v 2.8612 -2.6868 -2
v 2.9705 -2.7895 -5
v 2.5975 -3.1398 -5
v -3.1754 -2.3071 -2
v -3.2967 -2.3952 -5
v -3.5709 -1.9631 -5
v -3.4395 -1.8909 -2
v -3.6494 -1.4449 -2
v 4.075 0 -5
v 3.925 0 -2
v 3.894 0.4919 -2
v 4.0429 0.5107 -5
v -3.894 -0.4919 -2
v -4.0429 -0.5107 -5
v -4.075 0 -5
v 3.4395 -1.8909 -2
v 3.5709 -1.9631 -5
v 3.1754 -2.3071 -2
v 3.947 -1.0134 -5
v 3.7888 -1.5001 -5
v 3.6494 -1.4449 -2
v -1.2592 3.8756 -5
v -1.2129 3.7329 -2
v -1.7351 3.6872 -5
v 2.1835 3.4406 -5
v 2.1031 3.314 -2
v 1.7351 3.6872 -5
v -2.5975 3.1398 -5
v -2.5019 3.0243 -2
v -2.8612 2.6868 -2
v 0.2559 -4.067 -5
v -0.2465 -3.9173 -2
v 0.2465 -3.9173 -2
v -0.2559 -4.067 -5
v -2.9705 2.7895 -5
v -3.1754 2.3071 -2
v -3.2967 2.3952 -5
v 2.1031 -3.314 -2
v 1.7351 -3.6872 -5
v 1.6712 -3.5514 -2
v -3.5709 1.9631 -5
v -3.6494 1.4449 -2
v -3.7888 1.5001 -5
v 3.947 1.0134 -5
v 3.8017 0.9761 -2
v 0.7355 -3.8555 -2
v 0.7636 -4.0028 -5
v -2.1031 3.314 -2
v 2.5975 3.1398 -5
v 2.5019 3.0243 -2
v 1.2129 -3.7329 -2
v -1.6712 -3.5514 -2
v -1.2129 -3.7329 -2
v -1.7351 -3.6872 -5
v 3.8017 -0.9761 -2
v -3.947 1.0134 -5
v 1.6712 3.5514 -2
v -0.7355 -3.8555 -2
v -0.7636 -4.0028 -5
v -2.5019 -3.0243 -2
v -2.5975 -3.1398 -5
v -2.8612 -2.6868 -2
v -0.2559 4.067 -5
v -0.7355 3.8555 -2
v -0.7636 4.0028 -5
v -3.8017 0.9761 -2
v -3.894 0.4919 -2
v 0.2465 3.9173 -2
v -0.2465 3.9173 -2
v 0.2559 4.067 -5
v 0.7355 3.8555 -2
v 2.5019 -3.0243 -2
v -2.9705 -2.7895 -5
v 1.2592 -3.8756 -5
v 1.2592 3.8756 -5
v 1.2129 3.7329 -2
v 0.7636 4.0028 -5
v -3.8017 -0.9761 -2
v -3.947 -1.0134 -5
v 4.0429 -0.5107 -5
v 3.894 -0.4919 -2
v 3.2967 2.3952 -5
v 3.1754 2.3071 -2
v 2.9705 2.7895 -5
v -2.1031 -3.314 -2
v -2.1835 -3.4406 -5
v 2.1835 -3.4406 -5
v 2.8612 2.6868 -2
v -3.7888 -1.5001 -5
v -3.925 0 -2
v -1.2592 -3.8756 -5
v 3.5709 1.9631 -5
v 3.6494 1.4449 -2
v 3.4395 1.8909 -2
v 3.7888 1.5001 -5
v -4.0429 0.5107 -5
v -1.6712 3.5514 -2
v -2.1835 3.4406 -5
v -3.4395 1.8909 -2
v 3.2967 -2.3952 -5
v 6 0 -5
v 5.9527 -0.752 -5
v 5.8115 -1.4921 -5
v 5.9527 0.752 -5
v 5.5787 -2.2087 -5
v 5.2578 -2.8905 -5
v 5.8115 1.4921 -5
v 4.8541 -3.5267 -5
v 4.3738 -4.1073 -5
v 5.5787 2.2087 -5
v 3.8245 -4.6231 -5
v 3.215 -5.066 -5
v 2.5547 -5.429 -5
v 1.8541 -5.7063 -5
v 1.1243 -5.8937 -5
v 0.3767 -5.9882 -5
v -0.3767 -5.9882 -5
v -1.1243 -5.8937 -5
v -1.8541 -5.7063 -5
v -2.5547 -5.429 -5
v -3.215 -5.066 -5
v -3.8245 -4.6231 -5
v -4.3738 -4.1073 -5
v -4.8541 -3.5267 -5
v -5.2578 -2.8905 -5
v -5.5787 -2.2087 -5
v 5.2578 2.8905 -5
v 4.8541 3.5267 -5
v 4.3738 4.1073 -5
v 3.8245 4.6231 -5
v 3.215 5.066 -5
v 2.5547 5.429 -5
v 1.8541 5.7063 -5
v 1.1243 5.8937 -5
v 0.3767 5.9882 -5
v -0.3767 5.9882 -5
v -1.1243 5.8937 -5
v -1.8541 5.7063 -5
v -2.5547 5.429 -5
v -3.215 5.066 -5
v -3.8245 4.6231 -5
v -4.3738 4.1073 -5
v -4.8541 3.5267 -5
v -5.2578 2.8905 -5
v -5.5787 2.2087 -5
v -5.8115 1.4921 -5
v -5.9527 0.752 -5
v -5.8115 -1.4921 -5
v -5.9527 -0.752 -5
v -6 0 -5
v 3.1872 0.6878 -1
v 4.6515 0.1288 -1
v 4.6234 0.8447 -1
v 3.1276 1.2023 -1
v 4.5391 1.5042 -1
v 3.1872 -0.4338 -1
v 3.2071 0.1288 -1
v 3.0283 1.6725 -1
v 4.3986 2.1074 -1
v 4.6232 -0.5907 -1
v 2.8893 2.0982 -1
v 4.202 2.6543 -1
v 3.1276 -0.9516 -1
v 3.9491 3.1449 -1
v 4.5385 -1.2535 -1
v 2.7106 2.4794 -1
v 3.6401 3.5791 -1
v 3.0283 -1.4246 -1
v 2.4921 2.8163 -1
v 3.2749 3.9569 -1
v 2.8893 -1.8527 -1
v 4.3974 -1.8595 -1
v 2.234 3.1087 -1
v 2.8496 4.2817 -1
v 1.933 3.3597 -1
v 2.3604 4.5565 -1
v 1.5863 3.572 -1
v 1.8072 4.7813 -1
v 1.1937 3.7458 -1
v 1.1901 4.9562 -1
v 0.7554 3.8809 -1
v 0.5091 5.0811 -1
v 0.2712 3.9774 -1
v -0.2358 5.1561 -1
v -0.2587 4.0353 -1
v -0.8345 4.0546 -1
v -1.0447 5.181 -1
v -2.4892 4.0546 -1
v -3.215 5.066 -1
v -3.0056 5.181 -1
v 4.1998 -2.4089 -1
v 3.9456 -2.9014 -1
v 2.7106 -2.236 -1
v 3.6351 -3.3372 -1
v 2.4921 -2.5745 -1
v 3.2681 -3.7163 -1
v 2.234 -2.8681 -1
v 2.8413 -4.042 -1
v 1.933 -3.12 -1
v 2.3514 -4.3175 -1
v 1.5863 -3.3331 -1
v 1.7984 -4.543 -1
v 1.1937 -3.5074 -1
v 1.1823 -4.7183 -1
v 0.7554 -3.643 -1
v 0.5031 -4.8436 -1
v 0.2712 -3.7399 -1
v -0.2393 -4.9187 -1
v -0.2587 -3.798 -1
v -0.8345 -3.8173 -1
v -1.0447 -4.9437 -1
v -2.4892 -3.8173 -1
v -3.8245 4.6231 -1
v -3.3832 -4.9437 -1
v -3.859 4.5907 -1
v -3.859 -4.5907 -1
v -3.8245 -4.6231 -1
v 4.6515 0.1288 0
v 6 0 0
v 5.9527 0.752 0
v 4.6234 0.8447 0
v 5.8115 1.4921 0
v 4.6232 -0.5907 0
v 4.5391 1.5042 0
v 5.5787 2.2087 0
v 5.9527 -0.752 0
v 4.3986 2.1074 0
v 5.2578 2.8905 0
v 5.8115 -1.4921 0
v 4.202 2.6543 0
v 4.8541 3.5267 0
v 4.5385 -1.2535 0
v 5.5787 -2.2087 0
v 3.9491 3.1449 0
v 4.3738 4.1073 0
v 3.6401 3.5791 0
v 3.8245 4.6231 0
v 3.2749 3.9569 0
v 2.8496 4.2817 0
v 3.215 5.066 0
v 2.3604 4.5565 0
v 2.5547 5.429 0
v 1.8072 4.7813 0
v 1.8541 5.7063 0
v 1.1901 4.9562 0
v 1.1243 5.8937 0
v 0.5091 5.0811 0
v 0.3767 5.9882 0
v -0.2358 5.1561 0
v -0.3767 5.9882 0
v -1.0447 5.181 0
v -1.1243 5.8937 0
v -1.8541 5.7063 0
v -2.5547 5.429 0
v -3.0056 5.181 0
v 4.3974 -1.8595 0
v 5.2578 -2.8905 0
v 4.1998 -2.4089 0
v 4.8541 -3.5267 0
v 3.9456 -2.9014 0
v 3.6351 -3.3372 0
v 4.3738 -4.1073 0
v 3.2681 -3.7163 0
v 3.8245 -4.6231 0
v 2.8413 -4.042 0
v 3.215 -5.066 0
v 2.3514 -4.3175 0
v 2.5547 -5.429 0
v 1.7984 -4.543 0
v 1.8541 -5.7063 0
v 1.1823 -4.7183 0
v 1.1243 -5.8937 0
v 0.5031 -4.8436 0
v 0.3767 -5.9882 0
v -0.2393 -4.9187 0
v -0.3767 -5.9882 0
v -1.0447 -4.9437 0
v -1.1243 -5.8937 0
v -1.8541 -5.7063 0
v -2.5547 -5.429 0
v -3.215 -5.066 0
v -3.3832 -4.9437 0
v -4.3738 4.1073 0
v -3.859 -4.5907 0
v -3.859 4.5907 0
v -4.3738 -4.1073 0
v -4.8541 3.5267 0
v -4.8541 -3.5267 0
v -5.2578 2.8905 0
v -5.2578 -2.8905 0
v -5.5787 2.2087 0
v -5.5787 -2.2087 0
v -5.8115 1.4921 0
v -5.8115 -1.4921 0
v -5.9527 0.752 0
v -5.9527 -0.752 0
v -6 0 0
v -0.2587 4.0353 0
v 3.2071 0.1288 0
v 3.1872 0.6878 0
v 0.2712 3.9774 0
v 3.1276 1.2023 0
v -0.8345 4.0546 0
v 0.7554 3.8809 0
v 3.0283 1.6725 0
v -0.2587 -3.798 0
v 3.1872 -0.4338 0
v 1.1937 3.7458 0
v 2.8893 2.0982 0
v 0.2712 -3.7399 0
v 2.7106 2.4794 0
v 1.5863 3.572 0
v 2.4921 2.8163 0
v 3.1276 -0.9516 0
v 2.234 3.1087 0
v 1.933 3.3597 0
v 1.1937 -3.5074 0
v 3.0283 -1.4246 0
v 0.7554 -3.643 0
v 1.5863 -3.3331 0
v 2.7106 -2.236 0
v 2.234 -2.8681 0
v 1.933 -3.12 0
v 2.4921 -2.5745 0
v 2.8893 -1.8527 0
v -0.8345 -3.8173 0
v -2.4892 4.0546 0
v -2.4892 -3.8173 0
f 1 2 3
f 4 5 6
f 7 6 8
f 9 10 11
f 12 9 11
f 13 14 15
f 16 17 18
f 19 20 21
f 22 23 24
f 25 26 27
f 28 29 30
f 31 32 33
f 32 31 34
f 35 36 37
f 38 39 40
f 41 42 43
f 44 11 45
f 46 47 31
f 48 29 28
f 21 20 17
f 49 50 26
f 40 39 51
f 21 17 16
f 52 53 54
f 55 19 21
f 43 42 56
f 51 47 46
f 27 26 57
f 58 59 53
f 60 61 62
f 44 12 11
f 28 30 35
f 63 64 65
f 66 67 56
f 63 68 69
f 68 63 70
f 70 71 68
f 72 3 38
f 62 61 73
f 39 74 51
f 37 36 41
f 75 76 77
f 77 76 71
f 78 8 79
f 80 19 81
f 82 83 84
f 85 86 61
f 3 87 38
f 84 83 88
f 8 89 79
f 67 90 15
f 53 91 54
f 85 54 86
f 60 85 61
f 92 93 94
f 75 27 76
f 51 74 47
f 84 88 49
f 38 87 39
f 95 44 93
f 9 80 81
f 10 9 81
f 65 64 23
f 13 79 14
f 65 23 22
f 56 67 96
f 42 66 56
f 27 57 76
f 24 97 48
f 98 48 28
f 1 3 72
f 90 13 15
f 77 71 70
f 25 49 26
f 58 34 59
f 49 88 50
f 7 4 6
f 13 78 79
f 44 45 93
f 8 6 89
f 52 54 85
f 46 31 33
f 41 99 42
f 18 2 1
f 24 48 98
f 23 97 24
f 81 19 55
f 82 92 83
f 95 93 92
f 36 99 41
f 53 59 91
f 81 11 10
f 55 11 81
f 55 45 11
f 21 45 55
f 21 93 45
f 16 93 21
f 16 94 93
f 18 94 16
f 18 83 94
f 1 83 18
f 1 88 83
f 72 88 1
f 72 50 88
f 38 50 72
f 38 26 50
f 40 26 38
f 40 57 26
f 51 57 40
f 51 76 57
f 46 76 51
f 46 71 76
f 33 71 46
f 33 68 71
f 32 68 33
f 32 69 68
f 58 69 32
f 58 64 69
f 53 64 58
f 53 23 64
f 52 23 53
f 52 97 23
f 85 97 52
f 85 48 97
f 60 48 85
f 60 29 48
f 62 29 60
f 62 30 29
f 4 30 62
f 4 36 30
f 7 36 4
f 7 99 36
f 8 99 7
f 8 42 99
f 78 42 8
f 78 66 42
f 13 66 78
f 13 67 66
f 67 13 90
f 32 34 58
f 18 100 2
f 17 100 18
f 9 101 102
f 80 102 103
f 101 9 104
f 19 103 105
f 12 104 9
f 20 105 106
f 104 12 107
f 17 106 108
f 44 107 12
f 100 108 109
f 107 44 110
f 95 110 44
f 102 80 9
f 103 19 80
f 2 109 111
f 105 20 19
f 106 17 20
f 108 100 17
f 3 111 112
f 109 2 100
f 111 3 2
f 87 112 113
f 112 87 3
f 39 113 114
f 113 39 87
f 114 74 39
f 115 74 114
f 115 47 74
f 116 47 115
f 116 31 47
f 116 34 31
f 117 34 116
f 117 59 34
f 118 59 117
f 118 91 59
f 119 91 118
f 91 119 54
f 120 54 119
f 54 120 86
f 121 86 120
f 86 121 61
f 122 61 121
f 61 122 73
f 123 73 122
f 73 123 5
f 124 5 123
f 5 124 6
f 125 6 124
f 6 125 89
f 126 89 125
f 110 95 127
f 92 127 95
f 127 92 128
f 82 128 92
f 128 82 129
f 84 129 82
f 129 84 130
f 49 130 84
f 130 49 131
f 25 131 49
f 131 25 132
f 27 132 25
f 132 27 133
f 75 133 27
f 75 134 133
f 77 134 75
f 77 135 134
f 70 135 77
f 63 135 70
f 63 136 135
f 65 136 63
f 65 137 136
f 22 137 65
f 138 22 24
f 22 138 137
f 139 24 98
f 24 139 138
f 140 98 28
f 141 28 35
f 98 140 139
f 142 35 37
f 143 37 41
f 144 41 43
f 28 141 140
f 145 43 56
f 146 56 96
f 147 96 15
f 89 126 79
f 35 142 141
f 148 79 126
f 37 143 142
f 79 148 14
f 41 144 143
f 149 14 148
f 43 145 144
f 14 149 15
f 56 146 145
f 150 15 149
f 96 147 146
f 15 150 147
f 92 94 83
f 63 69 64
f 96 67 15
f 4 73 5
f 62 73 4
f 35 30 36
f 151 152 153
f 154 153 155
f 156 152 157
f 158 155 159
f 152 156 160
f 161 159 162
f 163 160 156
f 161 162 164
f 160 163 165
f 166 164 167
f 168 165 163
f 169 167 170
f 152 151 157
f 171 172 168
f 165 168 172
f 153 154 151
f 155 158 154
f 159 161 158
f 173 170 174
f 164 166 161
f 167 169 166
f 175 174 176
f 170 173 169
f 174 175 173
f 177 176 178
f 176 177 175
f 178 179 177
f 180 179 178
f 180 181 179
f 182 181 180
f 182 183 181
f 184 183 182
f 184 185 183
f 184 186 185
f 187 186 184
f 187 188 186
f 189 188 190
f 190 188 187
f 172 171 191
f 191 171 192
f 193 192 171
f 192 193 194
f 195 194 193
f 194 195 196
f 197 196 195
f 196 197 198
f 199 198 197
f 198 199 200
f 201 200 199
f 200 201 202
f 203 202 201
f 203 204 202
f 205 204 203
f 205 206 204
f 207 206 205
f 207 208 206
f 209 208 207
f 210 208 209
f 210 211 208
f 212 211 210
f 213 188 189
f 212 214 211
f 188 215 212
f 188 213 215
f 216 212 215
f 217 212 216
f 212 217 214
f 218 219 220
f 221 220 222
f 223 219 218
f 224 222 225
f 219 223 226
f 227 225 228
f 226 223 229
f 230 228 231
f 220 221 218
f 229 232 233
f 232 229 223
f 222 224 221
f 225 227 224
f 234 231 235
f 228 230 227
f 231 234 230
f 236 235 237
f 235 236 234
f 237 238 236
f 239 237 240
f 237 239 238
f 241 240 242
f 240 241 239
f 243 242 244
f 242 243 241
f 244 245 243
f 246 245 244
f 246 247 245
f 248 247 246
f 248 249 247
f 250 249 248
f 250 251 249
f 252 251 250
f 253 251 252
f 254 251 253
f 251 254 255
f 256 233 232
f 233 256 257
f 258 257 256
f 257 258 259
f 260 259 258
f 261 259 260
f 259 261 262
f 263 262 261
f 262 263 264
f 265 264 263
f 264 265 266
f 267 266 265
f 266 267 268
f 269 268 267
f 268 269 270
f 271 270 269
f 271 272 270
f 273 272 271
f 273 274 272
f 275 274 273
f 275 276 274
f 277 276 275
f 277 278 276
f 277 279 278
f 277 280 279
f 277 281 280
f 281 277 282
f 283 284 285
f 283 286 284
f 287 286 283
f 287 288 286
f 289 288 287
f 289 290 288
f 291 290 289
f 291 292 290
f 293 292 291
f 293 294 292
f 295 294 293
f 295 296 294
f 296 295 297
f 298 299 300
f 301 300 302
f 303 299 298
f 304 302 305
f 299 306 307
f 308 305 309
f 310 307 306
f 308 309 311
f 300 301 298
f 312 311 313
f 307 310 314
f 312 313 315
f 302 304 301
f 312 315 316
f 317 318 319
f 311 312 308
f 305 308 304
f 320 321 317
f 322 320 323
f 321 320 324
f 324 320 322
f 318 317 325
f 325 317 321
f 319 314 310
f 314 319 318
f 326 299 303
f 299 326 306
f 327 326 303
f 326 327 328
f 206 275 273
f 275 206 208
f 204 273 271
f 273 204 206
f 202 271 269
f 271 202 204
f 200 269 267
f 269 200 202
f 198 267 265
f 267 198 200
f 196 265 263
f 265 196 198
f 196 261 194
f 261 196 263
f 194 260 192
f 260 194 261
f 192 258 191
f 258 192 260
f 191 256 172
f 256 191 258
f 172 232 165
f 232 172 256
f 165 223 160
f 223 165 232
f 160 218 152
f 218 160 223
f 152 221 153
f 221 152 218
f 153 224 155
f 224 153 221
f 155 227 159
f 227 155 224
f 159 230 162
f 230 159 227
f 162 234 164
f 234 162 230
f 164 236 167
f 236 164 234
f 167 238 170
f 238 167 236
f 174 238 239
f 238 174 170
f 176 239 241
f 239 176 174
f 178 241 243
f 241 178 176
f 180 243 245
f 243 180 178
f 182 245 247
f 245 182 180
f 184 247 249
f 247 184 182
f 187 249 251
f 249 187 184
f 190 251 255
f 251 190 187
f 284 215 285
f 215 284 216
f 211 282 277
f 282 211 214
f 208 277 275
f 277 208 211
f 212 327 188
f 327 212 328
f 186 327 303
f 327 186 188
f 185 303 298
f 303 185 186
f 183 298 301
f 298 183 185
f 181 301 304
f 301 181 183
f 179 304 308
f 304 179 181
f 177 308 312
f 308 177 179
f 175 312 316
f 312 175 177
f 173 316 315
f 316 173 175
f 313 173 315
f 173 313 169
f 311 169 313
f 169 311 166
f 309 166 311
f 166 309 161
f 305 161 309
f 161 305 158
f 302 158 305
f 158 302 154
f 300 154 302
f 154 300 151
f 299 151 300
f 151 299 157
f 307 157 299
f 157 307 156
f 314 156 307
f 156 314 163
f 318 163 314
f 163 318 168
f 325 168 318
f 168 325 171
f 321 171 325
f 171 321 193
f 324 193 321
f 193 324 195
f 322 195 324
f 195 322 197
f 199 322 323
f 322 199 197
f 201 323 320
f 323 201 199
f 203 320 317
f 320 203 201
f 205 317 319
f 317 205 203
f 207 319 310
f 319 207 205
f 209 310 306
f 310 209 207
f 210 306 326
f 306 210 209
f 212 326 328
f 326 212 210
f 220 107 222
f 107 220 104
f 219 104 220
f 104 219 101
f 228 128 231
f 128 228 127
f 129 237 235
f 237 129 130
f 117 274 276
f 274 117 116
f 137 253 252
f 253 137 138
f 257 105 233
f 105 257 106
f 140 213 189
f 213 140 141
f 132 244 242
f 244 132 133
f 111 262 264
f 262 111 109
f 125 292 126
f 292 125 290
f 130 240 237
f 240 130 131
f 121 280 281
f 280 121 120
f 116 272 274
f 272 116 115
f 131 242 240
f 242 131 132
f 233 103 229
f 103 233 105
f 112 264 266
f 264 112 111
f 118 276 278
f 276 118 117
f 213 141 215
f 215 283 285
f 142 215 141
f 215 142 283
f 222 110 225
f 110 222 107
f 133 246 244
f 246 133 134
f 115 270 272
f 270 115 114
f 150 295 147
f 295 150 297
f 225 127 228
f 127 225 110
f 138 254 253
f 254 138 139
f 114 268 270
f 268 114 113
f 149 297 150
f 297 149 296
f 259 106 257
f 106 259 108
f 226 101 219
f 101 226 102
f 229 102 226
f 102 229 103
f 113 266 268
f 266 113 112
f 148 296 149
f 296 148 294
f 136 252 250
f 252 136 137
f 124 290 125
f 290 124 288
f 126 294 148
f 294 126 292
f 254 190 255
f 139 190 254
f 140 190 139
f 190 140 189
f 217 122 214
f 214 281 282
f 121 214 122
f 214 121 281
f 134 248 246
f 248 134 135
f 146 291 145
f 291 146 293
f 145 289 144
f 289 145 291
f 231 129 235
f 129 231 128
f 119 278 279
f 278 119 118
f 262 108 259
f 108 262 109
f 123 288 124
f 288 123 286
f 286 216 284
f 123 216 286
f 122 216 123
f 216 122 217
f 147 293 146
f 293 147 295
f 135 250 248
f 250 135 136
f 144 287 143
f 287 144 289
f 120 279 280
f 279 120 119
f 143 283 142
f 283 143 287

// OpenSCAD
$fn = 50;

difference() {
	union() {
		translate(v = [0, 0, -5.0]) {
			cylinder(h = 5, r = 6.0);
		}
	}
	union() {
		#translate(v = [0, 0, -5.0]) {
			cylinder(h = 3, r1 = 4.075, r2 = 3.925);
		}
		translate(v = [0, 0, -1]) {
			linear_extrude(height = 1) {
				text(font = "Impact", halign = "center", size = 10, text = "D", valign = "center");
			}
		}
	}
}
